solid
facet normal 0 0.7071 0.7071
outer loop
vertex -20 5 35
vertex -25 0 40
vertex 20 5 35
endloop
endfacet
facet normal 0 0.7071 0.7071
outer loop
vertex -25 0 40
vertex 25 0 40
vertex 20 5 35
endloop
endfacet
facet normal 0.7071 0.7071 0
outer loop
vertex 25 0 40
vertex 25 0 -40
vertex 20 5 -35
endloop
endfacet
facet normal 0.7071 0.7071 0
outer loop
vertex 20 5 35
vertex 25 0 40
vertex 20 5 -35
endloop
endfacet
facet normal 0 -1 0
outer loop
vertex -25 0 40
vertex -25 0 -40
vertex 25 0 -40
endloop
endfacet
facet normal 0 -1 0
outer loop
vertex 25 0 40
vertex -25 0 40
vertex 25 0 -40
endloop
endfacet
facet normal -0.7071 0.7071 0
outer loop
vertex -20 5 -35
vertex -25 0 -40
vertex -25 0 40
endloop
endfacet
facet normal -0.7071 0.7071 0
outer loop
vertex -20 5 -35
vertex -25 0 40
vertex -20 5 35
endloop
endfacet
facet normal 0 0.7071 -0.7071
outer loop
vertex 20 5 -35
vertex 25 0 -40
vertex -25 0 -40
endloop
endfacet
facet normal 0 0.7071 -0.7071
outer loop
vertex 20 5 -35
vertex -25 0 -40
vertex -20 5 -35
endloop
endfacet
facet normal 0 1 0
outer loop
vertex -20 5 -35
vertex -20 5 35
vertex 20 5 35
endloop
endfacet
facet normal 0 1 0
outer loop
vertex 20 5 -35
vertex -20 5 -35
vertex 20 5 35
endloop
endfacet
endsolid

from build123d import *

# Parameters (mm, degrees)
SKETCH1_W               = 50
SKETCH1_H               = 80
BOSS_EXTRUDE1_DEPTH     = 5
CUT_EXTRUDE1_DEPTH      = 41
CUT_EXTRUDE1_DEPTH_BACK = 41
CUT_EXTRUDE2_DEPTH      = 26
CUT_EXTRUDE2_DEPTH_BACK = 26


with BuildPart() as part:
    # Sketch1 → Boss-Extrude1 (new body)
    with BuildSketch(Plane(origin=(0, 0, 0), x_dir=(1, 0, 0), z_dir=(0, 1, 0))):
        Rectangle(SKETCH1_W, SKETCH1_H)
    extrude(amount=BOSS_EXTRUDE1_DEPTH)

    # Sketch2 → Cut-Extrude1 (cut, two sides)
    with BuildSketch(Plane.XY) as cut_extrude1_sk:
        Polygon((-25, 0), (-20, 5), (-25, 5), align=None)
        Polygon((25, 0), (20, 5), (25, 5), align=None)
    extrude(amount=CUT_EXTRUDE1_DEPTH, mode=Mode.SUBTRACT)
    extrude(cut_extrude1_sk.sketch, amount=-CUT_EXTRUDE1_DEPTH_BACK, mode=Mode.SUBTRACT)

    # Sketch3 → Cut-Extrude2 (cut, two sides)
    with BuildSketch(Plane(origin=(0, 0, 0), x_dir=(0, 0, -1), z_dir=(1, 0, 0))) as cut_extrude2_sk:
        Polygon((-40, 0), (-35, 5), (-40, 5), align=None)
        Polygon((40, 0), (35, 5), (40, 5), align=None)
    extrude(amount=CUT_EXTRUDE2_DEPTH, mode=Mode.SUBTRACT)
    extrude(cut_extrude2_sk.sketch, amount=-CUT_EXTRUDE2_DEPTH_BACK, mode=Mode.SUBTRACT)


solid = part.part
